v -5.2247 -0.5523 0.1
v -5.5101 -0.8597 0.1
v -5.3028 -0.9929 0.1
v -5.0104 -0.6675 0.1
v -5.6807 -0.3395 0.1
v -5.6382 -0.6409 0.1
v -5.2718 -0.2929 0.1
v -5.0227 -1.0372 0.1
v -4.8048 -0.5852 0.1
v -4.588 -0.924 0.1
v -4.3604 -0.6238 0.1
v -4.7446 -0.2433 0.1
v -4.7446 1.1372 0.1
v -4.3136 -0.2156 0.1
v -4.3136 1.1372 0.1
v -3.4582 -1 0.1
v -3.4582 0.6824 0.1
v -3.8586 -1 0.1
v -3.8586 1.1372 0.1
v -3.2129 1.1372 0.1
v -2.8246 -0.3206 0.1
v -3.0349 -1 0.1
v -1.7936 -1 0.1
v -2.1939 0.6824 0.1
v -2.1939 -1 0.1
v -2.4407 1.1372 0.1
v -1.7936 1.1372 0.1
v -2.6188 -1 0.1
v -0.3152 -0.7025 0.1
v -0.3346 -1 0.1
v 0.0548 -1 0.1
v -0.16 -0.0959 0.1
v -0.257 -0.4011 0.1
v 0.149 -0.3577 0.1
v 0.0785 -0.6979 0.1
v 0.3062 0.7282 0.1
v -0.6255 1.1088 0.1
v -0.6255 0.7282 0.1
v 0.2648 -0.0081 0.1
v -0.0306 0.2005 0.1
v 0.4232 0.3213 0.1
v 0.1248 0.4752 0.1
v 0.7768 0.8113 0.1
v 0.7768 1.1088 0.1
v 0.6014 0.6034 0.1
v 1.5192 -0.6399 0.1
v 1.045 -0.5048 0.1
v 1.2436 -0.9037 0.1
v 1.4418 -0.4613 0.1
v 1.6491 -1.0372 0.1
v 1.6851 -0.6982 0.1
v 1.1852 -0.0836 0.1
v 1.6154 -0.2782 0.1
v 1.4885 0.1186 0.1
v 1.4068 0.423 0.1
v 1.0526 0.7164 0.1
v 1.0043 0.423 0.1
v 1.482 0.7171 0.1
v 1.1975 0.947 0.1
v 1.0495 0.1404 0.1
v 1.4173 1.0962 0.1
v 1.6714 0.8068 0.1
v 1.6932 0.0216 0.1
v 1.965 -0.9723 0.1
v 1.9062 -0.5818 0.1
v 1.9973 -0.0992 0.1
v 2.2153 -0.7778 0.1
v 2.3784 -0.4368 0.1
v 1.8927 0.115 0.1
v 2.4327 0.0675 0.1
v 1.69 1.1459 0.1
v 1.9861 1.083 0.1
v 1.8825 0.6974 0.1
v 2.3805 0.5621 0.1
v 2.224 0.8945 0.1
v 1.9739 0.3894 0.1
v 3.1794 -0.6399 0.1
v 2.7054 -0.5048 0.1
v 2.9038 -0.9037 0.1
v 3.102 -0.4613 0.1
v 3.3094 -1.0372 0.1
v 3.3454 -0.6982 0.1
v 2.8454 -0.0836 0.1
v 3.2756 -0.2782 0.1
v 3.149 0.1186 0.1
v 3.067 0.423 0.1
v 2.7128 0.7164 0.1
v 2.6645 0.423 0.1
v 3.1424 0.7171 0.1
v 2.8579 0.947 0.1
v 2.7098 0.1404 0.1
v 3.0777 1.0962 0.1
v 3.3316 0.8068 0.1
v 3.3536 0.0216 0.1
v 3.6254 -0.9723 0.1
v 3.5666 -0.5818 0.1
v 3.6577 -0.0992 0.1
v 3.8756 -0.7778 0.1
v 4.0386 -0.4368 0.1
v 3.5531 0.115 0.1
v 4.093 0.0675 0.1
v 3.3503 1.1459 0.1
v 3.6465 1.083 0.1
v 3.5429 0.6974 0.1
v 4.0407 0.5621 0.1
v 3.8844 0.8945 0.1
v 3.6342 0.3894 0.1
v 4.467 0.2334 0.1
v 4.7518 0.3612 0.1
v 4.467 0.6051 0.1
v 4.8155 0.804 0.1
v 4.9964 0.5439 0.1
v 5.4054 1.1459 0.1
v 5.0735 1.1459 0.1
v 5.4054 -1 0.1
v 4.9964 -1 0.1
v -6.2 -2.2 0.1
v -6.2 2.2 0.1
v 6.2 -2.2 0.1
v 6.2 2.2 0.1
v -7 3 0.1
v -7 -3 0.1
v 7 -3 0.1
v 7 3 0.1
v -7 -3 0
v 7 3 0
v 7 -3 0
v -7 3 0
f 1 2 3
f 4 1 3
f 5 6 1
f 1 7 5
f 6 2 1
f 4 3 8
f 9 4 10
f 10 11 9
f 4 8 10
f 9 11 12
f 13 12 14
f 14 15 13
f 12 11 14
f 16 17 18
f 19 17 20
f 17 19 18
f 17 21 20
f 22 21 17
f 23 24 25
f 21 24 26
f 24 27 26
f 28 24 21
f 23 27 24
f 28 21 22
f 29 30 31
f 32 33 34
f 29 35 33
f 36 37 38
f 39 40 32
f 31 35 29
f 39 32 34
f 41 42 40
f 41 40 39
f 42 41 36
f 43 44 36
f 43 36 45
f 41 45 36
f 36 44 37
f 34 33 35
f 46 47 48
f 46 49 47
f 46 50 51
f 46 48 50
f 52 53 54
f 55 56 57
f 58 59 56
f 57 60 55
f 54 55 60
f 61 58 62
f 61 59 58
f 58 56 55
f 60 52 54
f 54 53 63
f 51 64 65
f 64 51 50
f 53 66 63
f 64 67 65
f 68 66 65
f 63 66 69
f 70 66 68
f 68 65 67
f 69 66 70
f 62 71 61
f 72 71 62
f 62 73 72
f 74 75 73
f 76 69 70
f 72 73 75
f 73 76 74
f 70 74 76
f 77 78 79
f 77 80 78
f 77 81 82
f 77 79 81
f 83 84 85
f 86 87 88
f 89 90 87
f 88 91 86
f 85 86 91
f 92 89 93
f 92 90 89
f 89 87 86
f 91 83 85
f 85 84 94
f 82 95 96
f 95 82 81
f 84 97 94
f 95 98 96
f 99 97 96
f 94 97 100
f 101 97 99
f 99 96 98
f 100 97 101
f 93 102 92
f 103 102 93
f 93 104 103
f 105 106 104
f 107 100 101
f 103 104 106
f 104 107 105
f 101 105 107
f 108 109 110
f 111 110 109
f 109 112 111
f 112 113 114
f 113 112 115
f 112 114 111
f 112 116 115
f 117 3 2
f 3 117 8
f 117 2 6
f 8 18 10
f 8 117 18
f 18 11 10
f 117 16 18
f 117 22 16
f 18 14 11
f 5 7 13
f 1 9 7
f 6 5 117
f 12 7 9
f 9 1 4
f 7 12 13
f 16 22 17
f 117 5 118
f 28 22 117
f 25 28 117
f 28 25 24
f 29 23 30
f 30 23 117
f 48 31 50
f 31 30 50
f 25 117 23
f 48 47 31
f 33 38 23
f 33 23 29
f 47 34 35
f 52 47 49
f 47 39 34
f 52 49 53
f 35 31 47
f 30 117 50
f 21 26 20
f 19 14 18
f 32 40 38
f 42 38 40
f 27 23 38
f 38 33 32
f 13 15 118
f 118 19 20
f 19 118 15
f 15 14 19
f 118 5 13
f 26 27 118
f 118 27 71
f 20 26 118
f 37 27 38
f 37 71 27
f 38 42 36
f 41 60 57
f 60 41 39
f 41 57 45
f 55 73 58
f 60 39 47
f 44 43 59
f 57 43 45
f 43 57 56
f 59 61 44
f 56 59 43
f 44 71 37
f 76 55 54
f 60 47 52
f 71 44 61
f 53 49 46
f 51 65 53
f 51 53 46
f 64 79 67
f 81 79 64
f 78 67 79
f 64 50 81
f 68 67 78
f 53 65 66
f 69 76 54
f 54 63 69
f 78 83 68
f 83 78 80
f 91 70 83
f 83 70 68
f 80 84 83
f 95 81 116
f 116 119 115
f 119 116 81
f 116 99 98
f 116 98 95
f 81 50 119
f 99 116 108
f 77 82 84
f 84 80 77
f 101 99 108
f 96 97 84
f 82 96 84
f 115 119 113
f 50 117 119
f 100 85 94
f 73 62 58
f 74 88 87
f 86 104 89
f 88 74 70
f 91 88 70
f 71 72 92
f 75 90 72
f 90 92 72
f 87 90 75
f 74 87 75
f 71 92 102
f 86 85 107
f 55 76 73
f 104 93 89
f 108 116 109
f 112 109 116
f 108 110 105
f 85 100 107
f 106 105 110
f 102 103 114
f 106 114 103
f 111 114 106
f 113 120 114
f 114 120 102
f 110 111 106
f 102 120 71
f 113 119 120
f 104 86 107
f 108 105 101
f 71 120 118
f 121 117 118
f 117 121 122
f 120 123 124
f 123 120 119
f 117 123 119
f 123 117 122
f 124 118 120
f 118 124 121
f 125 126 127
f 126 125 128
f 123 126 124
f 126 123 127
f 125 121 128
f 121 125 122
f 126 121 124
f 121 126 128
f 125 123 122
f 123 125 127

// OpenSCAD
use <../lib.scad>
function ldraw_lib__59718b() = [
// 0 Sticker  0.6 x  2 with "JM 7991"
// 0 Name: 59718b.dat
// 0 Author: J.C. Tchang [tchang]
// 0 !LDRAW_ORG Part UPDATE 2025-09
// 0 !LICENSE Licensed under CC BY 4.0 : see CAreadme.txt
// 
// 0 BFC CERTIFY CCW
  [0,"BFC","CERTIFY"],
  [0,"BFC","CCW"],
// 
// 0 !KEYWORDS BrickLink 7991stk01, Rebrickable 59718
// 
// 0 !HISTORY 2011-12-29 [PTadmin] Official Update 2011-02
// 0 !HISTORY 2025-09-27 [OrionP] Changed winding to CCW
// 0 !HISTORY 2025-09-29 [OrionP] Official Update 2025-09
// 
// 3 0 -13.0618 -0.25 -1.3807 -13.7752 -0.25 -2.1493 -13.2571 -0.25 -2.4822
  [3,0,-13.0618,-0.25,-1.3807,-13.7752,-0.25,-2.1493,-13.2571,-0.25,-2.4822],
// 3 0 -12.526 -0.25 -1.6688 -13.0618 -0.25 -1.3807 -13.2571 -0.25 -2.4822
  [3,0,-12.526,-0.25,-1.6688,-13.0618,-0.25,-1.3807,-13.2571,-0.25,-2.4822],
// 3 0 -14.2018 -0.25 -0.8487 -14.0954 -0.25 -1.6022 -13.0618 -0.25 -1.3807
  [3,0,-14.2018,-0.25,-0.8487,-14.0954,-0.25,-1.6022,-13.0618,-0.25,-1.3807],
// 3 0 -13.0618 -0.25 -1.3807 -13.1795 -0.25 -0.7322 -14.2018 -0.25 -0.8487
  [3,0,-13.0618,-0.25,-1.3807,-13.1795,-0.25,-0.7322,-14.2018,-0.25,-0.8487],
// 3 0 -14.0954 -0.25 -1.6022 -13.7752 -0.25 -2.1493 -13.0618 -0.25 -1.3807
  [3,0,-14.0954,-0.25,-1.6022,-13.7752,-0.25,-2.1493,-13.0618,-0.25,-1.3807],
// 3 0 -12.526 -0.25 -1.6688 -13.2571 -0.25 -2.4822 -12.5568 -0.25 -2.5931
  [3,0,-12.526,-0.25,-1.6688,-13.2571,-0.25,-2.4822,-12.5568,-0.25,-2.5931],
// 3 0 -12.0119 -0.25 -1.4629 -12.526 -0.25 -1.6688 -11.47 -0.25 -2.31
  [3,0,-12.0119,-0.25,-1.4629,-12.526,-0.25,-1.6688,-11.47,-0.25,-2.31],
// 3 0 -11.47 -0.25 -2.31 -10.901 -0.25 -1.5596 -12.0119 -0.25 -1.4629
  [3,0,-11.47,-0.25,-2.31,-10.901,-0.25,-1.5596,-12.0119,-0.25,-1.4629],
// 3 0 -12.526 -0.25 -1.6688 -12.5568 -0.25 -2.5931 -11.47 -0.25 -2.31
  [3,0,-12.526,-0.25,-1.6688,-12.5568,-0.25,-2.5931,-11.47,-0.25,-2.31],
// 3 0 -12.0119 -0.25 -1.4629 -10.901 -0.25 -1.5596 -11.8614 -0.25 -0.6083
  [3,0,-12.0119,-0.25,-1.4629,-10.901,-0.25,-1.5596,-11.8614,-0.25,-0.6083],
// 3 0 -11.8614 -0.25 2.8431 -11.8614 -0.25 -0.6083 -10.784 -0.25 -0.539
  [3,0,-11.8614,-0.25,2.8431,-11.8614,-0.25,-0.6083,-10.784,-0.25,-0.539],
// 3 0 -10.784 -0.25 -0.539 -10.784 -0.25 2.8431 -11.8614 -0.25 2.8431
  [3,0,-10.784,-0.25,-0.539,-10.784,-0.25,2.8431,-11.8614,-0.25,2.8431],
// 3 0 -11.8614 -0.25 -0.6083 -10.901 -0.25 -1.5596 -10.784 -0.25 -0.539
  [3,0,-11.8614,-0.25,-0.6083,-10.901,-0.25,-1.5596,-10.784,-0.25,-0.539],
// 3 0 -8.6455 -0.25 -2.5 -8.6455 -0.25 1.706 -9.6466 -0.25 -2.5
  [3,0,-8.6455,-0.25,-2.5,-8.6455,-0.25,1.706,-9.6466,-0.25,-2.5],
// 3 0 -9.6466 -0.25 2.8431 -8.6455 -0.25 1.706 -8.0323 -0.25 2.8431
  [3,0,-9.6466,-0.25,2.8431,-8.6455,-0.25,1.706,-8.0323,-0.25,2.8431],
// 3 0 -8.6455 -0.25 1.706 -9.6466 -0.25 2.8431 -9.6466 -0.25 -2.5
  [3,0,-8.6455,-0.25,1.706,-9.6466,-0.25,2.8431,-9.6466,-0.25,-2.5],
// 3 0 -8.6455 -0.25 1.706 -7.0615 -0.25 -0.8015 -8.0323 -0.25 2.8431
  [3,0,-8.6455,-0.25,1.706,-7.0615,-0.25,-0.8015,-8.0323,-0.25,2.8431],
// 3 0 -7.5872 -0.25 -2.5 -7.0615 -0.25 -0.8015 -8.6455 -0.25 1.706
  [3,0,-7.5872,-0.25,-2.5,-7.0615,-0.25,-0.8015,-8.6455,-0.25,1.706],
// 3 0 -4.484 -0.25 -2.5 -5.4847 -0.25 1.706 -5.4847 -0.25 -2.5
  [3,0,-4.484,-0.25,-2.5,-5.4847,-0.25,1.706,-5.4847,-0.25,-2.5],
// 3 0 -7.0615 -0.25 -0.8015 -5.4847 -0.25 1.706 -6.1017 -0.25 2.8431
  [3,0,-7.0615,-0.25,-0.8015,-5.4847,-0.25,1.706,-6.1017,-0.25,2.8431],
// 3 0 -5.4847 -0.25 1.706 -4.484 -0.25 2.8431 -6.1017 -0.25 2.8431
  [3,0,-5.4847,-0.25,1.706,-4.484,-0.25,2.8431,-6.1017,-0.25,2.8431],
// 3 0 -6.5469 -0.25 -2.5 -5.4847 -0.25 1.706 -7.0615 -0.25 -0.8015
  [3,0,-6.5469,-0.25,-2.5,-5.4847,-0.25,1.706,-7.0615,-0.25,-0.8015],
// 3 0 -4.484 -0.25 -2.5 -4.484 -0.25 2.8431 -5.4847 -0.25 1.706
  [3,0,-4.484,-0.25,-2.5,-4.484,-0.25,2.8431,-5.4847,-0.25,1.706],
// 3 0 -6.5469 -0.25 -2.5 -7.0615 -0.25 -0.8015 -7.5872 -0.25 -2.5
  [3,0,-6.5469,-0.25,-2.5,-7.0615,-0.25,-0.8015,-7.5872,-0.25,-2.5],
// 3 0 -0.788 -0.25 -1.7563 -0.8364 -0.25 -2.5 0.137 -0.25 -2.5
  [3,0,-0.788,-0.25,-1.7563,-0.8364,-0.25,-2.5,0.137,-0.25,-2.5],
// 3 0 -0.3999 -0.25 -0.2397 -0.6424 -0.25 -1.0027 0.3726 -0.25 -0.8942
  [3,0,-0.3999,-0.25,-0.2397,-0.6424,-0.25,-1.0027,0.3726,-0.25,-0.8942],
// 3 0 -0.788 -0.25 -1.7563 0.1962 -0.25 -1.7447 -0.6424 -0.25 -1.0027
  [3,0,-0.788,-0.25,-1.7563,0.1962,-0.25,-1.7447,-0.6424,-0.25,-1.0027],
// 3 0 0.7656 -0.25 1.8204 -1.5637 -0.25 2.772 -1.5637 -0.25 1.8204
  [3,0,0.7656,-0.25,1.8204,-1.5637,-0.25,2.772,-1.5637,-0.25,1.8204],
// 3 0 0.662 -0.25 -0.0203 -0.0765 -0.25 0.5013 -0.3999 -0.25 -0.2397
  [3,0,0.662,-0.25,-0.0203,-0.0765,-0.25,0.5013,-0.3999,-0.25,-0.2397],
// 3 0 0.137 -0.25 -2.5 0.1962 -0.25 -1.7447 -0.788 -0.25 -1.7563
  [3,0,0.137,-0.25,-2.5,0.1962,-0.25,-1.7447,-0.788,-0.25,-1.7563],
// 3 0 0.662 -0.25 -0.0203 -0.3999 -0.25 -0.2397 0.3726 -0.25 -0.8942
  [3,0,0.662,-0.25,-0.0203,-0.3999,-0.25,-0.2397,0.3726,-0.25,-0.8942],
// 3 0 1.0579 -0.25 0.8033 0.312 -0.25 1.188 -0.0765 -0.25 0.5013
  [3,0,1.0579,-0.25,0.8033,0.312,-0.25,1.188,-0.0765,-0.25,0.5013],
// 3 0 1.0579 -0.25 0.8033 -0.0765 -0.25 0.5013 0.662 -0.25 -0.0203
  [3,0,1.0579,-0.25,0.8033,-0.0765,-0.25,0.5013,0.662,-0.25,-0.0203],
// 3 0 0.312 -0.25 1.188 1.0579 -0.25 0.8033 0.7656 -0.25 1.8204
  [3,0,0.312,-0.25,1.188,1.0579,-0.25,0.8033,0.7656,-0.25,1.8204],
// 3 0 1.9419 -0.25 2.0283 1.9419 -0.25 2.772 0.7656 -0.25 1.8204
  [3,0,1.9419,-0.25,2.0283,1.9419,-0.25,2.772,0.7656,-0.25,1.8204],
// 3 0 1.9419 -0.25 2.0283 0.7656 -0.25 1.8204 1.5034 -0.25 1.5086
  [3,0,1.9419,-0.25,2.0283,0.7656,-0.25,1.8204,1.5034,-0.25,1.5086],
// 3 0 1.0579 -0.25 0.8033 1.5034 -0.25 1.5086 0.7656 -0.25 1.8204
  [3,0,1.0579,-0.25,0.8033,1.5034,-0.25,1.5086,0.7656,-0.25,1.8204],
// 3 0 0.7656 -0.25 1.8204 1.9419 -0.25 2.772 -1.5637 -0.25 2.772
  [3,0,0.7656,-0.25,1.8204,1.9419,-0.25,2.772,-1.5637,-0.25,2.772],
// 3 0 0.3726 -0.25 -0.8942 -0.6424 -0.25 -1.0027 0.1962 -0.25 -1.7447
  [3,0,0.3726,-0.25,-0.8942,-0.6424,-0.25,-1.0027,0.1962,-0.25,-1.7447],
// 3 0 3.798 -0.25 -1.5998 2.6126 -0.25 -1.2621 3.1089 -0.25 -2.2592
  [3,0,3.798,-0.25,-1.5998,2.6126,-0.25,-1.2621,3.1089,-0.25,-2.2592],
// 3 0 3.798 -0.25 -1.5998 3.6044 -0.25 -1.1532 2.6126 -0.25 -1.2621
  [3,0,3.798,-0.25,-1.5998,3.6044,-0.25,-1.1532,2.6126,-0.25,-1.2621],
// 3 0 3.798 -0.25 -1.5998 4.1228 -0.25 -2.5931 4.2127 -0.25 -1.7454
  [3,0,3.798,-0.25,-1.5998,4.1228,-0.25,-2.5931,4.2127,-0.25,-1.7454],
// 3 0 3.798 -0.25 -1.5998 3.1089 -0.25 -2.2592 4.1228 -0.25 -2.5931
  [3,0,3.798,-0.25,-1.5998,3.1089,-0.25,-2.2592,4.1228,-0.25,-2.5931],
// 3 0 2.9629 -0.25 -0.2089 4.0384 -0.25 -0.6954 3.7213 -0.25 0.2965
  [3,0,2.9629,-0.25,-0.2089,4.0384,-0.25,-0.6954,3.7213,-0.25,0.2965],
// 3 0 3.5169 -0.25 1.0574 2.6314 -0.25 1.791 2.5107 -0.25 1.0574
  [3,0,3.5169,-0.25,1.0574,2.6314,-0.25,1.791,2.5107,-0.25,1.0574],
// 3 0 3.7049 -0.25 1.7928 2.9937 -0.25 2.3674 2.6314 -0.25 1.791
  [3,0,3.7049,-0.25,1.7928,2.9937,-0.25,2.3674,2.6314,-0.25,1.791],
// 3 0 2.5107 -0.25 1.0574 2.6237 -0.25 0.3511 3.5169 -0.25 1.0574
  [3,0,2.5107,-0.25,1.0574,2.6237,-0.25,0.3511,3.5169,-0.25,1.0574],
// 3 0 3.7213 -0.25 0.2965 3.5169 -0.25 1.0574 2.6237 -0.25 0.3511
  [3,0,3.7213,-0.25,0.2965,3.5169,-0.25,1.0574,2.6237,-0.25,0.3511],
// 3 0 3.5432 -0.25 2.7406 3.7049 -0.25 1.7928 4.1785 -0.25 2.0171
  [3,0,3.5432,-0.25,2.7406,3.7049,-0.25,1.7928,4.1785,-0.25,2.0171],
// 3 0 3.5432 -0.25 2.7406 2.9937 -0.25 2.3674 3.7049 -0.25 1.7928
  [3,0,3.5432,-0.25,2.7406,2.9937,-0.25,2.3674,3.7049,-0.25,1.7928],
// 3 0 3.7049 -0.25 1.7928 2.6314 -0.25 1.791 3.5169 -0.25 1.0574
  [3,0,3.7049,-0.25,1.7928,2.6314,-0.25,1.791,3.5169,-0.25,1.0574],
// 3 0 2.6237 -0.25 0.3511 2.9629 -0.25 -0.2089 3.7213 -0.25 0.2965
  [3,0,2.6237,-0.25,0.3511,2.9629,-0.25,-0.2089,3.7213,-0.25,0.2965],
// 3 0 3.7213 -0.25 0.2965 4.0384 -0.25 -0.6954 4.233 -0.25 0.054
  [3,0,3.7213,-0.25,0.2965,4.0384,-0.25,-0.6954,4.233,-0.25,0.054],
// 3 0 4.2127 -0.25 -1.7454 4.9124 -0.25 -2.4307 4.7654 -0.25 -1.4546
  [3,0,4.2127,-0.25,-1.7454,4.9124,-0.25,-2.4307,4.7654,-0.25,-1.4546],
// 3 0 4.9124 -0.25 -2.4307 4.2127 -0.25 -1.7454 4.1228 -0.25 -2.5931
  [3,0,4.9124,-0.25,-2.4307,4.2127,-0.25,-1.7454,4.1228,-0.25,-2.5931],
// 3 0 4.0384 -0.25 -0.6954 4.9932 -0.25 -0.2481 4.233 -0.25 0.054
  [3,0,4.0384,-0.25,-0.6954,4.9932,-0.25,-0.2481,4.233,-0.25,0.054],
// 3 0 4.9124 -0.25 -2.4307 5.5382 -0.25 -1.9446 4.7654 -0.25 -1.4546
  [3,0,4.9124,-0.25,-2.4307,5.5382,-0.25,-1.9446,4.7654,-0.25,-1.4546],
// 3 0 5.946 -0.25 -1.092 4.9932 -0.25 -0.2481 4.7654 -0.25 -1.4546
  [3,0,5.946,-0.25,-1.092,4.9932,-0.25,-0.2481,4.7654,-0.25,-1.4546],
// 3 0 4.233 -0.25 0.054 4.9932 -0.25 -0.2481 4.7318 -0.25 0.2874
  [3,0,4.233,-0.25,0.054,4.9932,-0.25,-0.2481,4.7318,-0.25,0.2874],
// 3 0 6.0817 -0.25 0.1688 4.9932 -0.25 -0.2481 5.946 -0.25 -1.092
  [3,0,6.0817,-0.25,0.1688,4.9932,-0.25,-0.2481,5.946,-0.25,-1.092],
// 3 0 5.946 -0.25 -1.092 4.7654 -0.25 -1.4546 5.5382 -0.25 -1.9446
  [3,0,5.946,-0.25,-1.092,4.7654,-0.25,-1.4546,5.5382,-0.25,-1.9446],
// 3 0 4.7318 -0.25 0.2874 4.9932 -0.25 -0.2481 6.0817 -0.25 0.1688
  [3,0,4.7318,-0.25,0.2874,4.9932,-0.25,-0.2481,6.0817,-0.25,0.1688],
// 3 0 4.1785 -0.25 2.0171 4.225 -0.25 2.8648 3.5432 -0.25 2.7406
  [3,0,4.1785,-0.25,2.0171,4.225,-0.25,2.8648,3.5432,-0.25,2.7406],
// 3 0 4.9653 -0.25 2.7076 4.225 -0.25 2.8648 4.1785 -0.25 2.0171
  [3,0,4.9653,-0.25,2.7076,4.225,-0.25,2.8648,4.1785,-0.25,2.0171],
// 3 0 4.1785 -0.25 2.0171 4.7063 -0.25 1.7434 4.9653 -0.25 2.7076
  [3,0,4.1785,-0.25,2.0171,4.7063,-0.25,1.7434,4.9653,-0.25,2.7076],
// 3 0 5.9512 -0.25 1.4053 5.5599 -0.25 2.2362 4.7063 -0.25 1.7434
  [3,0,5.9512,-0.25,1.4053,5.5599,-0.25,2.2362,4.7063,-0.25,1.7434],
// 3 0 4.9348 -0.25 0.9734 4.7318 -0.25 0.2874 6.0817 -0.25 0.1688
  [3,0,4.9348,-0.25,0.9734,4.7318,-0.25,0.2874,6.0817,-0.25,0.1688],
// 3 0 4.9653 -0.25 2.7076 4.7063 -0.25 1.7434 5.5599 -0.25 2.2362
  [3,0,4.9653,-0.25,2.7076,4.7063,-0.25,1.7434,5.5599,-0.25,2.2362],
// 3 0 4.7063 -0.25 1.7434 4.9348 -0.25 0.9734 5.9512 -0.25 1.4053
  [3,0,4.7063,-0.25,1.7434,4.9348,-0.25,0.9734,5.9512,-0.25,1.4053],
// 3 0 6.0817 -0.25 0.1688 5.9512 -0.25 1.4053 4.9348 -0.25 0.9734
  [3,0,6.0817,-0.25,0.1688,5.9512,-0.25,1.4053,4.9348,-0.25,0.9734],
// 3 0 7.9486 -0.25 -1.5998 6.7635 -0.25 -1.2621 7.2595 -0.25 -2.2592
  [3,0,7.9486,-0.25,-1.5998,6.7635,-0.25,-1.2621,7.2595,-0.25,-2.2592],
// 3 0 7.9486 -0.25 -1.5998 7.7551 -0.25 -1.1532 6.7635 -0.25 -1.2621
  [3,0,7.9486,-0.25,-1.5998,7.7551,-0.25,-1.1532,6.7635,-0.25,-1.2621],
// 3 0 7.9486 -0.25 -1.5998 8.2734 -0.25 -2.5931 8.3634 -0.25 -1.7454
  [3,0,7.9486,-0.25,-1.5998,8.2734,-0.25,-2.5931,8.3634,-0.25,-1.7454],
// 3 0 7.9486 -0.25 -1.5998 7.2595 -0.25 -2.2592 8.2734 -0.25 -2.5931
  [3,0,7.9486,-0.25,-1.5998,7.2595,-0.25,-2.2592,8.2734,-0.25,-2.5931],
// 3 0 7.1136 -0.25 -0.2089 8.1891 -0.25 -0.6954 7.8724 -0.25 0.2965
  [3,0,7.1136,-0.25,-0.2089,8.1891,-0.25,-0.6954,7.8724,-0.25,0.2965],
// 3 0 7.6676 -0.25 1.0574 6.7821 -0.25 1.791 6.6613 -0.25 1.0574
  [3,0,7.6676,-0.25,1.0574,6.7821,-0.25,1.791,6.6613,-0.25,1.0574],
// 3 0 7.8559 -0.25 1.7928 7.1447 -0.25 2.3674 6.7821 -0.25 1.791
  [3,0,7.8559,-0.25,1.7928,7.1447,-0.25,2.3674,6.7821,-0.25,1.791],
// 3 0 6.6613 -0.25 1.0574 6.7744 -0.25 0.3511 7.6676 -0.25 1.0574
  [3,0,6.6613,-0.25,1.0574,6.7744,-0.25,0.3511,7.6676,-0.25,1.0574],
// 3 0 7.8724 -0.25 0.2965 7.6676 -0.25 1.0574 6.7744 -0.25 0.3511
  [3,0,7.8724,-0.25,0.2965,7.6676,-0.25,1.0574,6.7744,-0.25,0.3511],
// 3 0 7.6942 -0.25 2.7406 7.8559 -0.25 1.7928 8.3291 -0.25 2.0171
  [3,0,7.6942,-0.25,2.7406,7.8559,-0.25,1.7928,8.3291,-0.25,2.0171],
// 3 0 7.6942 -0.25 2.7406 7.1447 -0.25 2.3674 7.8559 -0.25 1.7928
  [3,0,7.6942,-0.25,2.7406,7.1447,-0.25,2.3674,7.8559,-0.25,1.7928],
// 3 0 7.8559 -0.25 1.7928 6.7821 -0.25 1.791 7.6676 -0.25 1.0574
  [3,0,7.8559,-0.25,1.7928,6.7821,-0.25,1.791,7.6676,-0.25,1.0574],
// 3 0 6.7744 -0.25 0.3511 7.1136 -0.25 -0.2089 7.8724 -0.25 0.2965
  [3,0,6.7744,-0.25,0.3511,7.1136,-0.25,-0.2089,7.8724,-0.25,0.2965],
// 3 0 7.8724 -0.25 0.2965 8.1891 -0.25 -0.6954 8.3841 -0.25 0.054
  [3,0,7.8724,-0.25,0.2965,8.1891,-0.25,-0.6954,8.3841,-0.25,0.054],
// 3 0 8.3634 -0.25 -1.7454 9.0634 -0.25 -2.4307 8.9164 -0.25 -1.4546
  [3,0,8.3634,-0.25,-1.7454,9.0634,-0.25,-2.4307,8.9164,-0.25,-1.4546],
// 3 0 9.0634 -0.25 -2.4307 8.3634 -0.25 -1.7454 8.2734 -0.25 -2.5931
  [3,0,9.0634,-0.25,-2.4307,8.3634,-0.25,-1.7454,8.2734,-0.25,-2.5931],
// 3 0 8.1891 -0.25 -0.6954 9.1442 -0.25 -0.2481 8.3841 -0.25 0.054
  [3,0,8.1891,-0.25,-0.6954,9.1442,-0.25,-0.2481,8.3841,-0.25,0.054],
// 3 0 9.0634 -0.25 -2.4307 9.6889 -0.25 -1.9446 8.9164 -0.25 -1.4546
  [3,0,9.0634,-0.25,-2.4307,9.6889,-0.25,-1.9446,8.9164,-0.25,-1.4546],
// 3 0 10.0966 -0.25 -1.092 9.1442 -0.25 -0.2481 8.9164 -0.25 -1.4546
  [3,0,10.0966,-0.25,-1.092,9.1442,-0.25,-0.2481,8.9164,-0.25,-1.4546],
// 3 0 8.3841 -0.25 0.054 9.1442 -0.25 -0.2481 8.8828 -0.25 0.2874
  [3,0,8.3841,-0.25,0.054,9.1442,-0.25,-0.2481,8.8828,-0.25,0.2874],
// 3 0 10.2324 -0.25 0.1688 9.1442 -0.25 -0.2481 10.0966 -0.25 -1.092
  [3,0,10.2324,-0.25,0.1688,9.1442,-0.25,-0.2481,10.0966,-0.25,-1.092],
// 3 0 10.0966 -0.25 -1.092 8.9164 -0.25 -1.4546 9.6889 -0.25 -1.9446
  [3,0,10.0966,-0.25,-1.092,8.9164,-0.25,-1.4546,9.6889,-0.25,-1.9446],
// 3 0 8.8828 -0.25 0.2874 9.1442 -0.25 -0.2481 10.2324 -0.25 0.1688
  [3,0,8.8828,-0.25,0.2874,9.1442,-0.25,-0.2481,10.2324,-0.25,0.1688],
// 3 0 8.3291 -0.25 2.0171 8.3757 -0.25 2.8648 7.6942 -0.25 2.7406
  [3,0,8.3291,-0.25,2.0171,8.3757,-0.25,2.8648,7.6942,-0.25,2.7406],
// 3 0 9.1163 -0.25 2.7076 8.3757 -0.25 2.8648 8.3291 -0.25 2.0171
  [3,0,9.1163,-0.25,2.7076,8.3757,-0.25,2.8648,8.3291,-0.25,2.0171],
// 3 0 8.3291 -0.25 2.0171 8.8573 -0.25 1.7434 9.1163 -0.25 2.7076
  [3,0,8.3291,-0.25,2.0171,8.8573,-0.25,1.7434,9.1163,-0.25,2.7076],
// 3 0 10.1018 -0.25 1.4053 9.7109 -0.25 2.2362 8.8573 -0.25 1.7434
  [3,0,10.1018,-0.25,1.4053,9.7109,-0.25,2.2362,8.8573,-0.25,1.7434],
// 3 0 9.0855 -0.25 0.9734 8.8828 -0.25 0.2874 10.2324 -0.25 0.1688
  [3,0,9.0855,-0.25,0.9734,8.8828,-0.25,0.2874,10.2324,-0.25,0.1688],
// 3 0 9.1163 -0.25 2.7076 8.8573 -0.25 1.7434 9.7109 -0.25 2.2362
  [3,0,9.1163,-0.25,2.7076,8.8573,-0.25,1.7434,9.7109,-0.25,2.2362],
// 3 0 8.8573 -0.25 1.7434 9.0855 -0.25 0.9734 10.1018 -0.25 1.4053
  [3,0,8.8573,-0.25,1.7434,9.0855,-0.25,0.9734,10.1018,-0.25,1.4053],
// 3 0 10.2324 -0.25 0.1688 10.1018 -0.25 1.4053 9.0855 -0.25 0.9734
  [3,0,10.2324,-0.25,0.1688,10.1018,-0.25,1.4053,9.0855,-0.25,0.9734],
// 3 0 11.1676 -0.25 0.5835 11.8795 -0.25 0.9031 11.1676 -0.25 1.5128
  [3,0,11.1676,-0.25,0.5835,11.8795,-0.25,0.9031,11.1676,-0.25,1.5128],
// 3 0 12.0387 -0.25 2.0101 11.1676 -0.25 1.5128 11.8795 -0.25 0.9031
  [3,0,12.0387,-0.25,2.0101,11.1676,-0.25,1.5128,11.8795,-0.25,0.9031],
// 3 0 11.8795 -0.25 0.9031 12.4909 -0.25 1.3598 12.0387 -0.25 2.0101
  [3,0,11.8795,-0.25,0.9031,12.4909,-0.25,1.3598,12.0387,-0.25,2.0101],
// 3 0 12.4909 -0.25 1.3598 13.5136 -0.25 2.8648 12.6838 -0.25 2.8648
  [3,0,12.4909,-0.25,1.3598,13.5136,-0.25,2.8648,12.6838,-0.25,2.8648],
// 3 0 13.5136 -0.25 2.8648 12.4909 -0.25 1.3598 13.5136 -0.25 -2.5
  [3,0,13.5136,-0.25,2.8648,12.4909,-0.25,1.3598,13.5136,-0.25,-2.5],
// 3 0 12.4909 -0.25 1.3598 12.6838 -0.25 2.8648 12.0387 -0.25 2.0101
  [3,0,12.4909,-0.25,1.3598,12.6838,-0.25,2.8648,12.0387,-0.25,2.0101],
// 3 0 12.4909 -0.25 1.3598 12.4909 -0.25 -2.5 13.5136 -0.25 -2.5
  [3,0,12.4909,-0.25,1.3598,12.4909,-0.25,-2.5,13.5136,-0.25,-2.5],
// 3 15 -15.5 -0.25 -5.5 -13.2571 -0.25 -2.4822 -13.7752 -0.25 -2.1493
  [3,15,-15.5,-0.25,-5.5,-13.2571,-0.25,-2.4822,-13.7752,-0.25,-2.1493],
// 3 15 -13.2571 -0.25 -2.4822 -15.5 -0.25 -5.5 -12.5568 -0.25 -2.5931
  [3,15,-13.2571,-0.25,-2.4822,-15.5,-0.25,-5.5,-12.5568,-0.25,-2.5931],
// 3 15 -15.5 -0.25 -5.5 -13.7752 -0.25 -2.1493 -14.0954 -0.25 -1.6022
  [3,15,-15.5,-0.25,-5.5,-13.7752,-0.25,-2.1493,-14.0954,-0.25,-1.6022],
// 3 15 -12.5568 -0.25 -2.5931 -9.6466 -0.25 -2.5 -11.47 -0.25 -2.31
  [3,15,-12.5568,-0.25,-2.5931,-9.6466,-0.25,-2.5,-11.47,-0.25,-2.31],
// 3 15 -12.5568 -0.25 -2.5931 -15.5 -0.25 -5.5 -9.6466 -0.25 -2.5
  [3,15,-12.5568,-0.25,-2.5931,-15.5,-0.25,-5.5,-9.6466,-0.25,-2.5],
// 3 15 -9.6466 -0.25 -2.5 -10.901 -0.25 -1.5596 -11.47 -0.25 -2.31
  [3,15,-9.6466,-0.25,-2.5,-10.901,-0.25,-1.5596,-11.47,-0.25,-2.31],
// 3 15 -15.5 -0.25 -5.5 -8.6455 -0.25 -2.5 -9.6466 -0.25 -2.5
  [3,15,-15.5,-0.25,-5.5,-8.6455,-0.25,-2.5,-9.6466,-0.25,-2.5],
// 3 15 -15.5 -0.25 -5.5 -7.5872 -0.25 -2.5 -8.6455 -0.25 -2.5
  [3,15,-15.5,-0.25,-5.5,-7.5872,-0.25,-2.5,-8.6455,-0.25,-2.5],
// 3 15 -9.6466 -0.25 -2.5 -10.784 -0.25 -0.539 -10.901 -0.25 -1.5596
  [3,15,-9.6466,-0.25,-2.5,-10.784,-0.25,-0.539,-10.901,-0.25,-1.5596],
// 3 15 -14.2018 -0.25 -0.8487 -13.1795 -0.25 -0.7322 -11.8614 -0.25 2.8431
  [3,15,-14.2018,-0.25,-0.8487,-13.1795,-0.25,-0.7322,-11.8614,-0.25,2.8431],
// 3 15 -13.0618 -0.25 -1.3807 -12.0119 -0.25 -1.4629 -13.1795 -0.25 -0.7322
  [3,15,-13.0618,-0.25,-1.3807,-12.0119,-0.25,-1.4629,-13.1795,-0.25,-0.7322],
// 3 15 -14.0954 -0.25 -1.6022 -14.2018 -0.25 -0.8487 -15.5 -0.25 -5.5
  [3,15,-14.0954,-0.25,-1.6022,-14.2018,-0.25,-0.8487,-15.5,-0.25,-5.5],
// 3 15 -11.8614 -0.25 -0.6083 -13.1795 -0.25 -0.7322 -12.0119 -0.25 -1.4629
  [3,15,-11.8614,-0.25,-0.6083,-13.1795,-0.25,-0.7322,-12.0119,-0.25,-1.4629],
// 3 15 -12.0119 -0.25 -1.4629 -13.0618 -0.25 -1.3807 -12.526 -0.25 -1.6688
  [3,15,-12.0119,-0.25,-1.4629,-13.0618,-0.25,-1.3807,-12.526,-0.25,-1.6688],
// 3 15 -13.1795 -0.25 -0.7322 -11.8614 -0.25 -0.6083 -11.8614 -0.25 2.8431
  [3,15,-13.1795,-0.25,-0.7322,-11.8614,-0.25,-0.6083,-11.8614,-0.25,2.8431],
// 3 15 -8.6455 -0.25 -2.5 -7.5872 -0.25 -2.5 -8.6455 -0.25 1.706
  [3,15,-8.6455,-0.25,-2.5,-7.5872,-0.25,-2.5,-8.6455,-0.25,1.706],
// 3 15 -15.5 -0.25 -5.5 -14.2018 -0.25 -0.8487 -15.5 -0.25 5.5
  [3,15,-15.5,-0.25,-5.5,-14.2018,-0.25,-0.8487,-15.5,-0.25,5.5],
// 3 15 -6.5469 -0.25 -2.5 -7.5872 -0.25 -2.5 -15.5 -0.25 -5.5
  [3,15,-6.5469,-0.25,-2.5,-7.5872,-0.25,-2.5,-15.5,-0.25,-5.5],
// 3 15 -5.4847 -0.25 -2.5 -6.5469 -0.25 -2.5 -15.5 -0.25 -5.5
  [3,15,-5.4847,-0.25,-2.5,-6.5469,-0.25,-2.5,-15.5,-0.25,-5.5],
// 3 15 -6.5469 -0.25 -2.5 -5.4847 -0.25 -2.5 -5.4847 -0.25 1.706
  [3,15,-6.5469,-0.25,-2.5,-5.4847,-0.25,-2.5,-5.4847,-0.25,1.706],
// 3 15 -0.788 -0.25 -1.7563 -4.484 -0.25 -2.5 -0.8364 -0.25 -2.5
  [3,15,-0.788,-0.25,-1.7563,-4.484,-0.25,-2.5,-0.8364,-0.25,-2.5],
// 3 15 -0.8364 -0.25 -2.5 -4.484 -0.25 -2.5 -15.5 -0.25 -5.5
  [3,15,-0.8364,-0.25,-2.5,-4.484,-0.25,-2.5,-15.5,-0.25,-5.5],
// 3 15 3.1089 -0.25 -2.2592 0.137 -0.25 -2.5 4.1228 -0.25 -2.5931
  [3,15,3.1089,-0.25,-2.2592,0.137,-0.25,-2.5,4.1228,-0.25,-2.5931],
// 3 15 0.137 -0.25 -2.5 -0.8364 -0.25 -2.5 4.1228 -0.25 -2.5931
  [3,15,0.137,-0.25,-2.5,-0.8364,-0.25,-2.5,4.1228,-0.25,-2.5931],
// 3 15 -5.4847 -0.25 -2.5 -15.5 -0.25 -5.5 -4.484 -0.25 -2.5
  [3,15,-5.4847,-0.25,-2.5,-15.5,-0.25,-5.5,-4.484,-0.25,-2.5],
// 3 15 3.1089 -0.25 -2.2592 2.6126 -0.25 -1.2621 0.137 -0.25 -2.5
  [3,15,3.1089,-0.25,-2.2592,2.6126,-0.25,-1.2621,0.137,-0.25,-2.5],
// 3 15 -0.6424 -0.25 -1.0027 -1.5637 -0.25 1.8204 -4.484 -0.25 -2.5
  [3,15,-0.6424,-0.25,-1.0027,-1.5637,-0.25,1.8204,-4.484,-0.25,-2.5],
// 3 15 -0.6424 -0.25 -1.0027 -4.484 -0.25 -2.5 -0.788 -0.25 -1.7563
  [3,15,-0.6424,-0.25,-1.0027,-4.484,-0.25,-2.5,-0.788,-0.25,-1.7563],
// 3 15 2.6126 -0.25 -1.2621 0.3726 -0.25 -0.8942 0.1962 -0.25 -1.7447
  [3,15,2.6126,-0.25,-1.2621,0.3726,-0.25,-0.8942,0.1962,-0.25,-1.7447],
// 3 15 2.9629 -0.25 -0.2089 2.6126 -0.25 -1.2621 3.6044 -0.25 -1.1532
  [3,15,2.9629,-0.25,-0.2089,2.6126,-0.25,-1.2621,3.6044,-0.25,-1.1532],
// 3 15 2.6126 -0.25 -1.2621 0.662 -0.25 -0.0203 0.3726 -0.25 -0.8942
  [3,15,2.6126,-0.25,-1.2621,0.662,-0.25,-0.0203,0.3726,-0.25,-0.8942],
// 3 15 2.9629 -0.25 -0.2089 3.6044 -0.25 -1.1532 4.0384 -0.25 -0.6954
  [3,15,2.9629,-0.25,-0.2089,3.6044,-0.25,-1.1532,4.0384,-0.25,-0.6954],
// 3 15 0.1962 -0.25 -1.7447 0.137 -0.25 -2.5 2.6126 -0.25 -1.2621
  [3,15,0.1962,-0.25,-1.7447,0.137,-0.25,-2.5,2.6126,-0.25,-1.2621],
// 3 15 -0.8364 -0.25 -2.5 -15.5 -0.25 -5.5 4.1228 -0.25 -2.5931
  [3,15,-0.8364,-0.25,-2.5,-15.5,-0.25,-5.5,4.1228,-0.25,-2.5931],
// 3 15 -7.0615 -0.25 -0.8015 -6.1017 -0.25 2.8431 -8.0323 -0.25 2.8431
  [3,15,-7.0615,-0.25,-0.8015,-6.1017,-0.25,2.8431,-8.0323,-0.25,2.8431],
// 3 15 -9.6466 -0.25 2.8431 -10.784 -0.25 -0.539 -9.6466 -0.25 -2.5
  [3,15,-9.6466,-0.25,2.8431,-10.784,-0.25,-0.539,-9.6466,-0.25,-2.5],
// 3 15 -0.3999 -0.25 -0.2397 -0.0765 -0.25 0.5013 -1.5637 -0.25 1.8204
  [3,15,-0.3999,-0.25,-0.2397,-0.0765,-0.25,0.5013,-1.5637,-0.25,1.8204],
// 3 15 0.312 -0.25 1.188 -1.5637 -0.25 1.8204 -0.0765 -0.25 0.5013
  [3,15,0.312,-0.25,1.188,-1.5637,-0.25,1.8204,-0.0765,-0.25,0.5013],
// 3 15 -4.484 -0.25 2.8431 -4.484 -0.25 -2.5 -1.5637 -0.25 1.8204
  [3,15,-4.484,-0.25,2.8431,-4.484,-0.25,-2.5,-1.5637,-0.25,1.8204],
// 3 15 -1.5637 -0.25 1.8204 -0.6424 -0.25 -1.0027 -0.3999 -0.25 -0.2397
  [3,15,-1.5637,-0.25,1.8204,-0.6424,-0.25,-1.0027,-0.3999,-0.25,-0.2397],
// 3 15 -11.8614 -0.25 2.8431 -10.784 -0.25 2.8431 -15.5 -0.25 5.5
  [3,15,-11.8614,-0.25,2.8431,-10.784,-0.25,2.8431,-15.5,-0.25,5.5],
// 3 15 -15.5 -0.25 5.5 -9.6466 -0.25 2.8431 -8.0323 -0.25 2.8431
  [3,15,-15.5,-0.25,5.5,-9.6466,-0.25,2.8431,-8.0323,-0.25,2.8431],
// 3 15 -9.6466 -0.25 2.8431 -15.5 -0.25 5.5 -10.784 -0.25 2.8431
  [3,15,-9.6466,-0.25,2.8431,-15.5,-0.25,5.5,-10.784,-0.25,2.8431],
// 3 15 -10.784 -0.25 2.8431 -10.784 -0.25 -0.539 -9.6466 -0.25 2.8431
  [3,15,-10.784,-0.25,2.8431,-10.784,-0.25,-0.539,-9.6466,-0.25,2.8431],
// 3 15 -15.5 -0.25 5.5 -14.2018 -0.25 -0.8487 -11.8614 -0.25 2.8431
  [3,15,-15.5,-0.25,5.5,-14.2018,-0.25,-0.8487,-11.8614,-0.25,2.8431],
// 3 15 -6.1017 -0.25 2.8431 -4.484 -0.25 2.8431 -15.5 -0.25 5.5
  [3,15,-6.1017,-0.25,2.8431,-4.484,-0.25,2.8431,-15.5,-0.25,5.5],
// 3 15 -15.5 -0.25 5.5 -4.484 -0.25 2.8431 4.225 -0.25 2.8648
  [3,15,-15.5,-0.25,5.5,-4.484,-0.25,2.8431,4.225,-0.25,2.8648],
// 3 15 -8.0323 -0.25 2.8431 -6.1017 -0.25 2.8431 -15.5 -0.25 5.5
  [3,15,-8.0323,-0.25,2.8431,-6.1017,-0.25,2.8431,-15.5,-0.25,5.5],
// 3 15 -1.5637 -0.25 2.772 -4.484 -0.25 2.8431 -1.5637 -0.25 1.8204
  [3,15,-1.5637,-0.25,2.772,-4.484,-0.25,2.8431,-1.5637,-0.25,1.8204],
// 3 15 -1.5637 -0.25 2.772 4.225 -0.25 2.8648 -4.484 -0.25 2.8431
  [3,15,-1.5637,-0.25,2.772,4.225,-0.25,2.8648,-4.484,-0.25,2.8431],
// 3 15 -1.5637 -0.25 1.8204 0.312 -0.25 1.188 0.7656 -0.25 1.8204
  [3,15,-1.5637,-0.25,1.8204,0.312,-0.25,1.188,0.7656,-0.25,1.8204],
// 3 15 1.0579 -0.25 0.8033 2.6237 -0.25 0.3511 2.5107 -0.25 1.0574
  [3,15,1.0579,-0.25,0.8033,2.6237,-0.25,0.3511,2.5107,-0.25,1.0574],
// 3 15 2.6237 -0.25 0.3511 1.0579 -0.25 0.8033 0.662 -0.25 -0.0203
  [3,15,2.6237,-0.25,0.3511,1.0579,-0.25,0.8033,0.662,-0.25,-0.0203],
// 3 15 1.0579 -0.25 0.8033 2.5107 -0.25 1.0574 1.5034 -0.25 1.5086
  [3,15,1.0579,-0.25,0.8033,2.5107,-0.25,1.0574,1.5034,-0.25,1.5086],
// 3 15 3.5169 -0.25 1.0574 4.7063 -0.25 1.7434 3.7049 -0.25 1.7928
  [3,15,3.5169,-0.25,1.0574,4.7063,-0.25,1.7434,3.7049,-0.25,1.7928],
// 3 15 2.6237 -0.25 0.3511 0.662 -0.25 -0.0203 2.6126 -0.25 -1.2621
  [3,15,2.6237,-0.25,0.3511,0.662,-0.25,-0.0203,2.6126,-0.25,-1.2621],
// 3 15 1.9419 -0.25 2.772 1.9419 -0.25 2.0283 2.9937 -0.25 2.3674
  [3,15,1.9419,-0.25,2.772,1.9419,-0.25,2.0283,2.9937,-0.25,2.3674],
// 3 15 2.5107 -0.25 1.0574 1.9419 -0.25 2.0283 1.5034 -0.25 1.5086
  [3,15,2.5107,-0.25,1.0574,1.9419,-0.25,2.0283,1.5034,-0.25,1.5086],
// 3 15 1.9419 -0.25 2.0283 2.5107 -0.25 1.0574 2.6314 -0.25 1.791
  [3,15,1.9419,-0.25,2.0283,2.5107,-0.25,1.0574,2.6314,-0.25,1.791],
// 3 15 2.9937 -0.25 2.3674 3.5432 -0.25 2.7406 1.9419 -0.25 2.772
  [3,15,2.9937,-0.25,2.3674,3.5432,-0.25,2.7406,1.9419,-0.25,2.772],
// 3 15 2.6314 -0.25 1.791 2.9937 -0.25 2.3674 1.9419 -0.25 2.0283
  [3,15,2.6314,-0.25,1.791,2.9937,-0.25,2.3674,1.9419,-0.25,2.0283],
// 3 15 1.9419 -0.25 2.772 4.225 -0.25 2.8648 -1.5637 -0.25 2.772
  [3,15,1.9419,-0.25,2.772,4.225,-0.25,2.8648,-1.5637,-0.25,2.772],
// 3 15 4.9348 -0.25 0.9734 3.5169 -0.25 1.0574 3.7213 -0.25 0.2965
  [3,15,4.9348,-0.25,0.9734,3.5169,-0.25,1.0574,3.7213,-0.25,0.2965],
// 3 15 2.6237 -0.25 0.3511 2.6126 -0.25 -1.2621 2.9629 -0.25 -0.2089
  [3,15,2.6237,-0.25,0.3511,2.6126,-0.25,-1.2621,2.9629,-0.25,-0.2089],
// 3 15 4.225 -0.25 2.8648 1.9419 -0.25 2.772 3.5432 -0.25 2.7406
  [3,15,4.225,-0.25,2.8648,1.9419,-0.25,2.772,3.5432,-0.25,2.7406],
// 3 15 4.0384 -0.25 -0.6954 3.6044 -0.25 -1.1532 3.798 -0.25 -1.5998
  [3,15,4.0384,-0.25,-0.6954,3.6044,-0.25,-1.1532,3.798,-0.25,-1.5998],
// 3 15 4.2127 -0.25 -1.7454 4.7654 -0.25 -1.4546 4.0384 -0.25 -0.6954
  [3,15,4.2127,-0.25,-1.7454,4.7654,-0.25,-1.4546,4.0384,-0.25,-0.6954],
// 3 15 4.2127 -0.25 -1.7454 4.0384 -0.25 -0.6954 3.798 -0.25 -1.5998
  [3,15,4.2127,-0.25,-1.7454,4.0384,-0.25,-0.6954,3.798,-0.25,-1.5998],
// 3 15 4.9124 -0.25 -2.4307 7.2595 -0.25 -2.2592 5.5382 -0.25 -1.9446
  [3,15,4.9124,-0.25,-2.4307,7.2595,-0.25,-2.2592,5.5382,-0.25,-1.9446],
// 3 15 8.2734 -0.25 -2.5931 7.2595 -0.25 -2.2592 4.9124 -0.25 -2.4307
  [3,15,8.2734,-0.25,-2.5931,7.2595,-0.25,-2.2592,4.9124,-0.25,-2.4307],
// 3 15 6.7635 -0.25 -1.2621 5.5382 -0.25 -1.9446 7.2595 -0.25 -2.2592
  [3,15,6.7635,-0.25,-1.2621,5.5382,-0.25,-1.9446,7.2595,-0.25,-2.2592],
// 3 15 4.9124 -0.25 -2.4307 4.1228 -0.25 -2.5931 8.2734 -0.25 -2.5931
  [3,15,4.9124,-0.25,-2.4307,4.1228,-0.25,-2.5931,8.2734,-0.25,-2.5931],
// 3 15 5.946 -0.25 -1.092 5.5382 -0.25 -1.9446 6.7635 -0.25 -1.2621
  [3,15,5.946,-0.25,-1.092,5.5382,-0.25,-1.9446,6.7635,-0.25,-1.2621],
// 3 15 4.0384 -0.25 -0.6954 4.7654 -0.25 -1.4546 4.9932 -0.25 -0.2481
  [3,15,4.0384,-0.25,-0.6954,4.7654,-0.25,-1.4546,4.9932,-0.25,-0.2481],
// 3 15 4.7318 -0.25 0.2874 4.9348 -0.25 0.9734 3.7213 -0.25 0.2965
  [3,15,4.7318,-0.25,0.2874,4.9348,-0.25,0.9734,3.7213,-0.25,0.2965],
// 3 15 3.7213 -0.25 0.2965 4.233 -0.25 0.054 4.7318 -0.25 0.2874
  [3,15,3.7213,-0.25,0.2965,4.233,-0.25,0.054,4.7318,-0.25,0.2874],
// 3 15 6.7635 -0.25 -1.2621 7.1136 -0.25 -0.2089 5.946 -0.25 -1.092
  [3,15,6.7635,-0.25,-1.2621,7.1136,-0.25,-0.2089,5.946,-0.25,-1.092],
// 3 15 7.1136 -0.25 -0.2089 6.7635 -0.25 -1.2621 7.7551 -0.25 -1.1532
  [3,15,7.1136,-0.25,-0.2089,6.7635,-0.25,-1.2621,7.7551,-0.25,-1.1532],
// 3 15 6.7744 -0.25 0.3511 6.0817 -0.25 0.1688 7.1136 -0.25 -0.2089
  [3,15,6.7744,-0.25,0.3511,6.0817,-0.25,0.1688,7.1136,-0.25,-0.2089],
// 3 15 7.1136 -0.25 -0.2089 6.0817 -0.25 0.1688 5.946 -0.25 -1.092
  [3,15,7.1136,-0.25,-0.2089,6.0817,-0.25,0.1688,5.946,-0.25,-1.092],
// 3 15 7.7551 -0.25 -1.1532 8.1891 -0.25 -0.6954 7.1136 -0.25 -0.2089
  [3,15,7.7551,-0.25,-1.1532,8.1891,-0.25,-0.6954,7.1136,-0.25,-0.2089],
// 3 15 9.0634 -0.25 -2.4307 8.2734 -0.25 -2.5931 12.4909 -0.25 -2.5
  [3,15,9.0634,-0.25,-2.4307,8.2734,-0.25,-2.5931,12.4909,-0.25,-2.5],
// 3 15 12.4909 -0.25 -2.5 15.5 -0.25 -5.5 13.5136 -0.25 -2.5
  [3,15,12.4909,-0.25,-2.5,15.5,-0.25,-5.5,13.5136,-0.25,-2.5],
// 3 15 15.5 -0.25 -5.5 12.4909 -0.25 -2.5 8.2734 -0.25 -2.5931
  [3,15,15.5,-0.25,-5.5,12.4909,-0.25,-2.5,8.2734,-0.25,-2.5931],
// 3 15 12.4909 -0.25 -2.5 10.0966 -0.25 -1.092 9.6889 -0.25 -1.9446
  [3,15,12.4909,-0.25,-2.5,10.0966,-0.25,-1.092,9.6889,-0.25,-1.9446],
// 3 15 12.4909 -0.25 -2.5 9.6889 -0.25 -1.9446 9.0634 -0.25 -2.4307
  [3,15,12.4909,-0.25,-2.5,9.6889,-0.25,-1.9446,9.0634,-0.25,-2.4307],
// 3 15 8.2734 -0.25 -2.5931 4.1228 -0.25 -2.5931 15.5 -0.25 -5.5
  [3,15,8.2734,-0.25,-2.5931,4.1228,-0.25,-2.5931,15.5,-0.25,-5.5],
// 3 15 10.0966 -0.25 -1.092 12.4909 -0.25 -2.5 11.1676 -0.25 0.5835
  [3,15,10.0966,-0.25,-1.092,12.4909,-0.25,-2.5,11.1676,-0.25,0.5835],
// 3 15 7.9486 -0.25 -1.5998 8.3634 -0.25 -1.7454 8.1891 -0.25 -0.6954
  [3,15,7.9486,-0.25,-1.5998,8.3634,-0.25,-1.7454,8.1891,-0.25,-0.6954],
// 3 15 8.1891 -0.25 -0.6954 7.7551 -0.25 -1.1532 7.9486 -0.25 -1.5998
  [3,15,8.1891,-0.25,-0.6954,7.7551,-0.25,-1.1532,7.9486,-0.25,-1.5998],
// 3 15 10.2324 -0.25 0.1688 10.0966 -0.25 -1.092 11.1676 -0.25 0.5835
  [3,15,10.2324,-0.25,0.1688,10.0966,-0.25,-1.092,11.1676,-0.25,0.5835],
// 3 15 8.9164 -0.25 -1.4546 9.1442 -0.25 -0.2481 8.1891 -0.25 -0.6954
  [3,15,8.9164,-0.25,-1.4546,9.1442,-0.25,-0.2481,8.1891,-0.25,-0.6954],
// 3 15 8.3634 -0.25 -1.7454 8.9164 -0.25 -1.4546 8.1891 -0.25 -0.6954
  [3,15,8.3634,-0.25,-1.7454,8.9164,-0.25,-1.4546,8.1891,-0.25,-0.6954],
// 3 15 13.5136 -0.25 -2.5 15.5 -0.25 -5.5 13.5136 -0.25 2.8648
  [3,15,13.5136,-0.25,-2.5,15.5,-0.25,-5.5,13.5136,-0.25,2.8648],
// 3 15 4.1228 -0.25 -2.5931 -15.5 -0.25 -5.5 15.5 -0.25 -5.5
  [3,15,4.1228,-0.25,-2.5931,-15.5,-0.25,-5.5,15.5,-0.25,-5.5],
// 3 15 8.8828 -0.25 0.2874 7.8724 -0.25 0.2965 8.3841 -0.25 0.054
  [3,15,8.8828,-0.25,0.2874,7.8724,-0.25,0.2965,8.3841,-0.25,0.054],
// 3 15 4.7063 -0.25 1.7434 4.1785 -0.25 2.0171 3.7049 -0.25 1.7928
  [3,15,4.7063,-0.25,1.7434,4.1785,-0.25,2.0171,3.7049,-0.25,1.7928],
// 3 15 5.9512 -0.25 1.4053 6.6613 -0.25 1.0574 6.7821 -0.25 1.791
  [3,15,5.9512,-0.25,1.4053,6.6613,-0.25,1.0574,6.7821,-0.25,1.791],
// 3 15 7.6676 -0.25 1.0574 8.8573 -0.25 1.7434 7.8559 -0.25 1.7928
  [3,15,7.6676,-0.25,1.0574,8.8573,-0.25,1.7434,7.8559,-0.25,1.7928],
// 3 15 6.6613 -0.25 1.0574 5.9512 -0.25 1.4053 6.0817 -0.25 0.1688
  [3,15,6.6613,-0.25,1.0574,5.9512,-0.25,1.4053,6.0817,-0.25,0.1688],
// 3 15 6.7744 -0.25 0.3511 6.6613 -0.25 1.0574 6.0817 -0.25 0.1688
  [3,15,6.7744,-0.25,0.3511,6.6613,-0.25,1.0574,6.0817,-0.25,0.1688],
// 3 15 4.225 -0.25 2.8648 4.9653 -0.25 2.7076 7.6942 -0.25 2.7406
  [3,15,4.225,-0.25,2.8648,4.9653,-0.25,2.7076,7.6942,-0.25,2.7406],
// 3 15 5.5599 -0.25 2.2362 7.1447 -0.25 2.3674 4.9653 -0.25 2.7076
  [3,15,5.5599,-0.25,2.2362,7.1447,-0.25,2.3674,4.9653,-0.25,2.7076],
// 3 15 7.1447 -0.25 2.3674 7.6942 -0.25 2.7406 4.9653 -0.25 2.7076
  [3,15,7.1447,-0.25,2.3674,7.6942,-0.25,2.7406,4.9653,-0.25,2.7076],
// 3 15 6.7821 -0.25 1.791 7.1447 -0.25 2.3674 5.5599 -0.25 2.2362
  [3,15,6.7821,-0.25,1.791,7.1447,-0.25,2.3674,5.5599,-0.25,2.2362],
// 3 15 5.9512 -0.25 1.4053 6.7821 -0.25 1.791 5.5599 -0.25 2.2362
  [3,15,5.9512,-0.25,1.4053,6.7821,-0.25,1.791,5.5599,-0.25,2.2362],
// 3 15 4.225 -0.25 2.8648 7.6942 -0.25 2.7406 8.3757 -0.25 2.8648
  [3,15,4.225,-0.25,2.8648,7.6942,-0.25,2.7406,8.3757,-0.25,2.8648],
// 3 15 7.6676 -0.25 1.0574 7.8724 -0.25 0.2965 9.0855 -0.25 0.9734
  [3,15,7.6676,-0.25,1.0574,7.8724,-0.25,0.2965,9.0855,-0.25,0.9734],
// 3 15 3.5169 -0.25 1.0574 4.9348 -0.25 0.9734 4.7063 -0.25 1.7434
  [3,15,3.5169,-0.25,1.0574,4.9348,-0.25,0.9734,4.7063,-0.25,1.7434],
// 3 15 8.8573 -0.25 1.7434 8.3291 -0.25 2.0171 7.8559 -0.25 1.7928
  [3,15,8.8573,-0.25,1.7434,8.3291,-0.25,2.0171,7.8559,-0.25,1.7928],
// 3 15 11.1676 -0.25 0.5835 12.4909 -0.25 -2.5 11.8795 -0.25 0.9031
  [3,15,11.1676,-0.25,0.5835,12.4909,-0.25,-2.5,11.8795,-0.25,0.9031],
// 3 15 12.4909 -0.25 1.3598 11.8795 -0.25 0.9031 12.4909 -0.25 -2.5
  [3,15,12.4909,-0.25,1.3598,11.8795,-0.25,0.9031,12.4909,-0.25,-2.5],
// 3 15 11.1676 -0.25 0.5835 11.1676 -0.25 1.5128 10.1018 -0.25 1.4053
  [3,15,11.1676,-0.25,0.5835,11.1676,-0.25,1.5128,10.1018,-0.25,1.4053],
// 3 15 7.8724 -0.25 0.2965 8.8828 -0.25 0.2874 9.0855 -0.25 0.9734
  [3,15,7.8724,-0.25,0.2965,8.8828,-0.25,0.2874,9.0855,-0.25,0.9734],
// 3 15 9.7109 -0.25 2.2362 10.1018 -0.25 1.4053 11.1676 -0.25 1.5128
  [3,15,9.7109,-0.25,2.2362,10.1018,-0.25,1.4053,11.1676,-0.25,1.5128],
// 3 15 8.3757 -0.25 2.8648 9.1163 -0.25 2.7076 12.6838 -0.25 2.8648
  [3,15,8.3757,-0.25,2.8648,9.1163,-0.25,2.7076,12.6838,-0.25,2.8648],
// 3 15 9.7109 -0.25 2.2362 12.6838 -0.25 2.8648 9.1163 -0.25 2.7076
  [3,15,9.7109,-0.25,2.2362,12.6838,-0.25,2.8648,9.1163,-0.25,2.7076],
// 3 15 12.0387 -0.25 2.0101 12.6838 -0.25 2.8648 9.7109 -0.25 2.2362
  [3,15,12.0387,-0.25,2.0101,12.6838,-0.25,2.8648,9.7109,-0.25,2.2362],
// 3 15 13.5136 -0.25 2.8648 15.5 -0.25 5.5 12.6838 -0.25 2.8648
  [3,15,13.5136,-0.25,2.8648,15.5,-0.25,5.5,12.6838,-0.25,2.8648],
// 3 15 12.6838 -0.25 2.8648 15.5 -0.25 5.5 8.3757 -0.25 2.8648
  [3,15,12.6838,-0.25,2.8648,15.5,-0.25,5.5,8.3757,-0.25,2.8648],
// 3 15 11.1676 -0.25 1.5128 12.0387 -0.25 2.0101 9.7109 -0.25 2.2362
  [3,15,11.1676,-0.25,1.5128,12.0387,-0.25,2.0101,9.7109,-0.25,2.2362],
// 3 15 8.3757 -0.25 2.8648 15.5 -0.25 5.5 4.225 -0.25 2.8648
  [3,15,8.3757,-0.25,2.8648,15.5,-0.25,5.5,4.225,-0.25,2.8648],
// 3 15 13.5136 -0.25 2.8648 15.5 -0.25 -5.5 15.5 -0.25 5.5
  [3,15,13.5136,-0.25,2.8648,15.5,-0.25,-5.5,15.5,-0.25,5.5],
// 3 15 8.8573 -0.25 1.7434 7.6676 -0.25 1.0574 9.0855 -0.25 0.9734
  [3,15,8.8573,-0.25,1.7434,7.6676,-0.25,1.0574,9.0855,-0.25,0.9734],
// 3 15 11.1676 -0.25 0.5835 10.1018 -0.25 1.4053 10.2324 -0.25 0.1688
  [3,15,11.1676,-0.25,0.5835,10.1018,-0.25,1.4053,10.2324,-0.25,0.1688],
// 3 15 4.225 -0.25 2.8648 15.5 -0.25 5.5 -15.5 -0.25 5.5
  [3,15,4.225,-0.25,2.8648,15.5,-0.25,5.5,-15.5,-0.25,5.5],
// 0 // Frame
// 4 0 -17.5 -0.25 -7.5 -15.5 -0.25 -5.5 -15.5 -0.25 5.5 -17.5 -0.25 7.5
  [4,0,-17.5,-0.25,-7.5,-15.5,-0.25,-5.5,-15.5,-0.25,5.5,-17.5,-0.25,7.5],
// 4 0 17.5 -0.25 7.5 15.5 -0.25 5.5 15.5 -0.25 -5.5 17.5 -0.25 -7.5
  [4,0,17.5,-0.25,7.5,15.5,-0.25,5.5,15.5,-0.25,-5.5,17.5,-0.25,-7.5],
// 4 0 17.5 -0.25 -7.5 15.5 -0.25 -5.5 -15.5 -0.25 -5.5 -17.5 -0.25 -7.5
  [4,0,17.5,-0.25,-7.5,15.5,-0.25,-5.5,-15.5,-0.25,-5.5,-17.5,-0.25,-7.5],
// 4 0 -17.5 -0.25 7.5 -15.5 -0.25 5.5 15.5 -0.25 5.5 17.5 -0.25 7.5
  [4,0,-17.5,-0.25,7.5,-15.5,-0.25,5.5,15.5,-0.25,5.5,17.5,-0.25,7.5],
// 0 // Box
// 4 15 17.5 0 7.5 17.5 0 -7.5 -17.5 0 -7.5 -17.5 0 7.5
  [4,15,17.5,0,7.5,17.5,0,-7.5,-17.5,0,-7.5,-17.5,0,7.5],
// 4 15 17.5 -0.25 7.5 17.5 -0.25 -7.5 17.5 0 -7.5 17.5 0 7.5
  [4,15,17.5,-0.25,7.5,17.5,-0.25,-7.5,17.5,0,-7.5,17.5,0,7.5],
// 4 15 -17.5 0 7.5 -17.5 0 -7.5 -17.5 -0.25 -7.5 -17.5 -0.25 7.5
  [4,15,-17.5,0,7.5,-17.5,0,-7.5,-17.5,-0.25,-7.5,-17.5,-0.25,7.5],
// 4 15 17.5 0 7.5 -17.5 0 7.5 -17.5 -0.25 7.5 17.5 -0.25 7.5
  [4,15,17.5,0,7.5,-17.5,0,7.5,-17.5,-0.25,7.5,17.5,-0.25,7.5],
// 4 15 17.5 -0.25 -7.5 -17.5 -0.25 -7.5 -17.5 0 -7.5 17.5 0 -7.5
  [4,15,17.5,-0.25,-7.5,-17.5,-0.25,-7.5,-17.5,0,-7.5,17.5,0,-7.5],
// 0 //
];
module ldraw_lib__59718b(step=0, col=false, unit=2/5, alt=false, line=0.2, solid=!$preview)
    makepoly(ldraw_lib__59718b(), step=step, col=col, unit=unit, alt=alt, line=line, solid=solid);
ldraw_lib__59718b(line=0.2);
